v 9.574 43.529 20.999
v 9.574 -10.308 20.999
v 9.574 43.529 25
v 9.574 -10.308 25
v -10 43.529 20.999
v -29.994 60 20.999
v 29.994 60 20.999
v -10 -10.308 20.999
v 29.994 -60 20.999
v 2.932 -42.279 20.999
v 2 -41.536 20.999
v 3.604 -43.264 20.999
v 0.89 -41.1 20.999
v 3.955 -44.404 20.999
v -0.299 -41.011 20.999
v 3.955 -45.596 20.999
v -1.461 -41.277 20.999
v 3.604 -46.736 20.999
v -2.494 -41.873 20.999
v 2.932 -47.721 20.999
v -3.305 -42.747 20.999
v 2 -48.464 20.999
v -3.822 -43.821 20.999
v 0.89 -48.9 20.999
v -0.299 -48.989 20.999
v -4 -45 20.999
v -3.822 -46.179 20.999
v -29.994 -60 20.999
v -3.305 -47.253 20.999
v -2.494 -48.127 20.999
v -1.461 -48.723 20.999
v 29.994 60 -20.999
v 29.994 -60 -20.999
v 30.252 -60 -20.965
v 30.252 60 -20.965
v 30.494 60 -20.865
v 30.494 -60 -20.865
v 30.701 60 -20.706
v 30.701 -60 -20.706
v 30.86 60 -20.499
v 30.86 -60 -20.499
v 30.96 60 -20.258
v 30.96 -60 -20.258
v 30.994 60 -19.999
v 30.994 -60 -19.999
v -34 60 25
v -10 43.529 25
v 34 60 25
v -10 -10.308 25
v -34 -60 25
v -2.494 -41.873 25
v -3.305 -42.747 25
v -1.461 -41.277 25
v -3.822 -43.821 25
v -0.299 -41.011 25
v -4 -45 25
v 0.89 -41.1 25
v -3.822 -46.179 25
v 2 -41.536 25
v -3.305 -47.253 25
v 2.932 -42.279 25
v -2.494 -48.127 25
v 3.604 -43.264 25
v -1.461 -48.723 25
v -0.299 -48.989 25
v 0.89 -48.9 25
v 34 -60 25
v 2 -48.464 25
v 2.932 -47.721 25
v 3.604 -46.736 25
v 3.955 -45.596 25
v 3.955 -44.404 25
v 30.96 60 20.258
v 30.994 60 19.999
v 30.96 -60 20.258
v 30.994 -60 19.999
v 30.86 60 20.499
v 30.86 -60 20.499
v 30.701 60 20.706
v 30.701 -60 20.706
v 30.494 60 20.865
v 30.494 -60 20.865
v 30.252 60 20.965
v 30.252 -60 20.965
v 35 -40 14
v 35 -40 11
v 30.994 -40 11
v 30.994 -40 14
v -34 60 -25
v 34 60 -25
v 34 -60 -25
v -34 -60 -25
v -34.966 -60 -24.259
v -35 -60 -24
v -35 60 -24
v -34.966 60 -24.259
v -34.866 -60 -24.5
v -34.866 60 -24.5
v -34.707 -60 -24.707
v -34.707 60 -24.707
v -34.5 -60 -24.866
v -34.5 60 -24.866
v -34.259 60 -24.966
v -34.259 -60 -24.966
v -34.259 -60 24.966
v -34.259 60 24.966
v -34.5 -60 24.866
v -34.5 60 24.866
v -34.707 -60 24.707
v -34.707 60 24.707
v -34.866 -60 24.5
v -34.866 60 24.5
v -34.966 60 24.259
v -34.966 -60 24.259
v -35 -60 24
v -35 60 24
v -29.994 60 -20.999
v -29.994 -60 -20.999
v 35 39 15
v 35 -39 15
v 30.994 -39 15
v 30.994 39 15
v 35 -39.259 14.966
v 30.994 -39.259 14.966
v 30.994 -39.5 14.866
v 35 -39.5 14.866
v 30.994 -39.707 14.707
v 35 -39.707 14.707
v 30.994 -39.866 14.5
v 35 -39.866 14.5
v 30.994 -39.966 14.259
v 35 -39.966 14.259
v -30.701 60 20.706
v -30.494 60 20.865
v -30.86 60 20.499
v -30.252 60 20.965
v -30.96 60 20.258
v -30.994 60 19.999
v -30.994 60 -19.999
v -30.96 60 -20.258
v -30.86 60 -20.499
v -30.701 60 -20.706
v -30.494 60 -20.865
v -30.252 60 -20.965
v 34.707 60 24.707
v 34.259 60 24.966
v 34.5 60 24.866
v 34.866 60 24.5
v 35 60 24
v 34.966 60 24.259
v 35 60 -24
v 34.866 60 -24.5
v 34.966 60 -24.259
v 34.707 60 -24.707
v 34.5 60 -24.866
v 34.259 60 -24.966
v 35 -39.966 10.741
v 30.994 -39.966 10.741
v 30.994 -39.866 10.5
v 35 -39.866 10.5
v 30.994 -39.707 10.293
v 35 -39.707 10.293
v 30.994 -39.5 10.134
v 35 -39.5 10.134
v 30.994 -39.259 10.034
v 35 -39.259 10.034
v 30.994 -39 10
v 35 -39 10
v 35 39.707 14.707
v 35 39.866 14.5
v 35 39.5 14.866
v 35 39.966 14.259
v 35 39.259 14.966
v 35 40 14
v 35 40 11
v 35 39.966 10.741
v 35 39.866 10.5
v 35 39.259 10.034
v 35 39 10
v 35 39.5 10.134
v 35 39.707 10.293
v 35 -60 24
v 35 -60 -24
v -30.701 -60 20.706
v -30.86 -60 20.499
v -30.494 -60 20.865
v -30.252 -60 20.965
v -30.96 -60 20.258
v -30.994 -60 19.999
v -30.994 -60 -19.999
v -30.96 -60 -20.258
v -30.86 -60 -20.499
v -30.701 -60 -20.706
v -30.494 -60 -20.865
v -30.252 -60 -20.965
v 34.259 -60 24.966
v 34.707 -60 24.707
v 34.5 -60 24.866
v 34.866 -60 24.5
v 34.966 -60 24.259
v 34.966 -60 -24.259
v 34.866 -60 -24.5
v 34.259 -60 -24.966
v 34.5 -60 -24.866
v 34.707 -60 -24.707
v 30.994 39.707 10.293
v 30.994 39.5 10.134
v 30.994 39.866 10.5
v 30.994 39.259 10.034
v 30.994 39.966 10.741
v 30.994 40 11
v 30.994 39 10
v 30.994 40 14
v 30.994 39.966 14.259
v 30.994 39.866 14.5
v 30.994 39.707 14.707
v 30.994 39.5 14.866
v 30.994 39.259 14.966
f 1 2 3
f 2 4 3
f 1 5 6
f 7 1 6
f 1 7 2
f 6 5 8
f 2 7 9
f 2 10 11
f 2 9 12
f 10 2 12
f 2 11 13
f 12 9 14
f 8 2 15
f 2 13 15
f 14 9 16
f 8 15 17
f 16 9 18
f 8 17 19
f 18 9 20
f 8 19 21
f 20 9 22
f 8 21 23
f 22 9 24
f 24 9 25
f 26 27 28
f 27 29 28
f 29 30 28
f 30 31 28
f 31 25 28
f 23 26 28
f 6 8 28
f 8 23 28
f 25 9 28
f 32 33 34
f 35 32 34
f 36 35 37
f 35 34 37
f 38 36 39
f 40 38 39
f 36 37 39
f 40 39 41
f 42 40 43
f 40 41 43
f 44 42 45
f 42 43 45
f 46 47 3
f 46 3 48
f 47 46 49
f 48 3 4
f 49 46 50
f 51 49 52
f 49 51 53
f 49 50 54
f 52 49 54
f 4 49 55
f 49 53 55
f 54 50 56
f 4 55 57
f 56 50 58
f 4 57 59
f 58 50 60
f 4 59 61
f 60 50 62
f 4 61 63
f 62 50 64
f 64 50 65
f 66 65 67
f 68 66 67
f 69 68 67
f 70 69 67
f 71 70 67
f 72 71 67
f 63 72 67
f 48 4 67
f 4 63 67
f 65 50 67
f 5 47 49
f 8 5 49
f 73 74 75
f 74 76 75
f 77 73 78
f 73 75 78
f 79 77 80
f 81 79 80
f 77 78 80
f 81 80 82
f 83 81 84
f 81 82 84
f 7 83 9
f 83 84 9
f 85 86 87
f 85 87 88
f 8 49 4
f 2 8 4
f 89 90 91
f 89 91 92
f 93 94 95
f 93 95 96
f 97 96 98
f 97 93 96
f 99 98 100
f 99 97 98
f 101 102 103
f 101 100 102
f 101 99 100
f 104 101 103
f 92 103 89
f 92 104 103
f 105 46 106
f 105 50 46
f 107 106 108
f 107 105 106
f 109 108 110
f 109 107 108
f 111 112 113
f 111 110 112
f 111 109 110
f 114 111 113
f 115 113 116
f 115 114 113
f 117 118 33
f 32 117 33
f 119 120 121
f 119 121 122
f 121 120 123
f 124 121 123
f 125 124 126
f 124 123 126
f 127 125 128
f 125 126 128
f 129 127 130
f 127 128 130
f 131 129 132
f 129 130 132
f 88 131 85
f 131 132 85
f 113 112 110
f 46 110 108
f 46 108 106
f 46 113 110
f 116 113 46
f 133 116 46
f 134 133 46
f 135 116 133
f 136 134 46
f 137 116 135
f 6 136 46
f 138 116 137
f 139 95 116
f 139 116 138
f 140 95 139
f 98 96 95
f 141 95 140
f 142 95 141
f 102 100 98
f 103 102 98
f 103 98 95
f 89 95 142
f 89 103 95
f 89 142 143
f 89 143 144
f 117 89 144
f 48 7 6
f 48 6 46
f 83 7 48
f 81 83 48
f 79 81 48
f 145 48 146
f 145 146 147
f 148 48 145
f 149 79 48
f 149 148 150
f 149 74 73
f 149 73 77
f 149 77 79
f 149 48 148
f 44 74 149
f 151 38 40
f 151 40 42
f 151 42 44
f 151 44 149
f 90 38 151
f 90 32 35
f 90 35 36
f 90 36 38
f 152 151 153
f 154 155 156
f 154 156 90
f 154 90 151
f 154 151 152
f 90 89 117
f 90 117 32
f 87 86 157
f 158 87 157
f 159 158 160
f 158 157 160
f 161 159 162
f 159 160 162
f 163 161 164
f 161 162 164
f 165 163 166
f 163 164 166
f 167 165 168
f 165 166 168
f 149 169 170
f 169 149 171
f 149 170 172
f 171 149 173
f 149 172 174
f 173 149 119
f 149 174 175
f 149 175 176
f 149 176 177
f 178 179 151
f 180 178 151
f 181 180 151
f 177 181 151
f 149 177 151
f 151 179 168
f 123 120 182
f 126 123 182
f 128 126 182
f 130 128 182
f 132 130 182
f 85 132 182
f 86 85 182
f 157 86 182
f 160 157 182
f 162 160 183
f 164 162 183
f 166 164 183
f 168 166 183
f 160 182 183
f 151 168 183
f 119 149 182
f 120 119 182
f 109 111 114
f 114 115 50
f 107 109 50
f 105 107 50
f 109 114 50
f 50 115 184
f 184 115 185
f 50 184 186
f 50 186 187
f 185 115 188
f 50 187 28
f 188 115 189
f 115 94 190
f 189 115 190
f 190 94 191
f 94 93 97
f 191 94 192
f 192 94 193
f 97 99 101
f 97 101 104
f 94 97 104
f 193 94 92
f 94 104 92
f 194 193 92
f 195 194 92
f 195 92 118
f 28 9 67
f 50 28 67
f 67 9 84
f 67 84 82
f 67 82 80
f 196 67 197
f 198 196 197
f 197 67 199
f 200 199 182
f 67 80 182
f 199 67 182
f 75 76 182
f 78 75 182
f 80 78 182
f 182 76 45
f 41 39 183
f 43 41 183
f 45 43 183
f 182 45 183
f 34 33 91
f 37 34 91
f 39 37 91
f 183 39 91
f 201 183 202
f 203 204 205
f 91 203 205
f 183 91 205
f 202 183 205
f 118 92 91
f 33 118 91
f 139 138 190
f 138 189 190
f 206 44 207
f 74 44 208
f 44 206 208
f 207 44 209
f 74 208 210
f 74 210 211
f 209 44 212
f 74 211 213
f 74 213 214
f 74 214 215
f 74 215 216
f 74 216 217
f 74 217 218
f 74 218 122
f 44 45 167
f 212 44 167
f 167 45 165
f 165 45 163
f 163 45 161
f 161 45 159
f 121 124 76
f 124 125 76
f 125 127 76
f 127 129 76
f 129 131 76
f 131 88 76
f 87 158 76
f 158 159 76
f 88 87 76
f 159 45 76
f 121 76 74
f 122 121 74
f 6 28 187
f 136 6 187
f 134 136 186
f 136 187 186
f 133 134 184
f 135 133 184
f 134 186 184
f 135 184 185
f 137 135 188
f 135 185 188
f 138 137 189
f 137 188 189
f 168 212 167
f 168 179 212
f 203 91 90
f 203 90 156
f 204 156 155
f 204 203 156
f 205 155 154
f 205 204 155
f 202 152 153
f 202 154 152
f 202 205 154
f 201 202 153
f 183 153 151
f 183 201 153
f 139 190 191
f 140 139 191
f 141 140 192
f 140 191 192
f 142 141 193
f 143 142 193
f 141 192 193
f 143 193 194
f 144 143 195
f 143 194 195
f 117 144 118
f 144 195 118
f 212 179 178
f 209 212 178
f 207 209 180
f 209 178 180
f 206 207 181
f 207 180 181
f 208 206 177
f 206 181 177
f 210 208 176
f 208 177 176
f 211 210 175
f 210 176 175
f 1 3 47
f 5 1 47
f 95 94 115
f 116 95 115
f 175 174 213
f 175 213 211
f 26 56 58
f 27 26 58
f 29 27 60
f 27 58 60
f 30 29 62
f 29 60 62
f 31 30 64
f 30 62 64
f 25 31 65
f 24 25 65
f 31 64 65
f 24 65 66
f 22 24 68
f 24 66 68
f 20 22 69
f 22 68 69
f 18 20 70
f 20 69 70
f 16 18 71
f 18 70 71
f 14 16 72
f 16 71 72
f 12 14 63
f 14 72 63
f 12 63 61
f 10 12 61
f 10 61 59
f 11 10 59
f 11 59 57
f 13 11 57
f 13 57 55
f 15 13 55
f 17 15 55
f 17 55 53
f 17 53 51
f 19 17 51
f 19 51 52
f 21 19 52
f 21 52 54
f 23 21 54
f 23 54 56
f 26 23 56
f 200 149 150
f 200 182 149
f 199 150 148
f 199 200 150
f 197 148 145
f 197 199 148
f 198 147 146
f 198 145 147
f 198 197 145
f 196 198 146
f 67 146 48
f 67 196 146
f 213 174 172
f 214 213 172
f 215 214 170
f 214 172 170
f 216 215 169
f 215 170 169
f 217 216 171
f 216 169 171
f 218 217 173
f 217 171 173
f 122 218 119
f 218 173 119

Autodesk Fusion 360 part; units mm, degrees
sketch "Sketch1" plane through (0, 0, 0) normal (0, 1, 0) x (1, 0, 0)
  line L0 (-65, 0) -> (50, 0) construction
  line L1 (-34, -25) -> (34, -25)
  line L2 (35, -24) -> (35, 24)
  line L3 (34, 25) -> (-34, 25)
  line L4 (-35, 24) -> (-35, -24)
  line L5 (-35, 25) -> (35, -25) construction
  line L6 (-35, -25) -> (35, 25) construction
  arc A0 (-35, -24) -> (-34, -25) centre (-34, -24) ccw
  arc A1 (34, -25) -> (35, -24) centre (34, -24) ccw
  arc A2 (35, 24) -> (34, 25) centre (34, 24) ccw
  arc A3 (-34, 25) -> (-35, 24) centre (-34, 24) ccw
  point P0 (-32.7786, 20)
  point P1 (32.2214, 20)
  point P2 (-32.7786, -20)
  dimension "d7" = 70
  dimension "d8" = 50
  dimension "d9" = 1
  dimension "d10" = 1
extrude "Extrude1" add sketch "Sketch1" along normal mid plane 120
sketch "Sketch2" plane through (0, -60, 0) normal (0, -1, 0) x (1, 0, 0)
  arc A0 (-35, -24) -> (-34, -25) centre (-34, -24) ccw
  line L0 (-34, -25) -> (34, -25)
  arc A1 (34, -25) -> (35, -24) centre (34, -24) ccw
  line L1 (35, -24) -> (35, 24)
  arc A2 (35, 24) -> (34, 25) centre (34, 24) ccw
  line L2 (34, 25) -> (-34, 25)
  arc A3 (-34, 25) -> (-35, 24) centre (-34, 24) ccw
  line L3 (-35, 24) -> (-35, -24)
  line L4 (-29.9936, -20.9993) -> (29.9936, -20.9993)
  line L5 (30.9936, -19.9993) -> (30.9936, 19.9993)
  line L6 (29.9936, 20.9993) -> (-29.9936, 20.9993)
  line L7 (-30.9936, 19.9993) -> (-30.9936, -19.9993)
  arc A4 (-29.9936, 20.9993) -> (-30.9936, 19.9993) centre (-29.9936, 19.9993) ccw
  arc A5 (30.9936, 19.9993) -> (29.9936, 20.9993) centre (29.9936, 19.9993) ccw
  arc A6 (29.9936, -20.9993) -> (30.9936, -19.9993) centre (29.9936, -19.9993) ccw
  arc A7 (-30.9936, -19.9993) -> (-29.9936, -20.9993) centre (-29.9936, -19.9993) ccw
  line L8 (-45, 0) -> (50, 0) construction
  line L9 (0, 30) -> (0, -30) construction
  dimension "d11" = 1
extrude "Extrude2" cut sketch "Sketch2" against normal blind 120 contours L4 L5 L6 L7 A4 A5 A6 A7
sketch "Sketch3" plane through (0, 0, 25) normal (0, 0, 1) x (-1, 0, 0)
  line L0 (-34, 60) -> (-34, -60)
  line L1 (-34, -60) -> (34, -60)
  line L2 (34, -60) -> (34, 60)
  line L3 (34, 60) -> (-34, 60)
  circle A0 centre (0, 45) radius 4
  line L4 (10, 10.3084) -> (-9.5736, 10.3084)
  line L5 (-9.5736, 10.3084) -> (-9.5736, -43.5288)
  line L6 (-9.5736, -43.5288) -> (10, -43.5288)
  line L7 (10, -43.5288) -> (10, 10.3084)
  dimension "d14" = 8
extrude "Extrude3" cut sketch "Sketch3" against normal blind 5 contours A0 | L4 L5 L6 L7
sketch "Sketch4" plane through (35, 0, 0) normal (1, 0, 0) x (0, 1, 0)
  line L0 (-60, -24) -> (60, -24)
  line L1 (60, -24) -> (60, 24)
  line L2 (60, 24) -> (-60, 24)
  line L3 (-60, 24) -> (-60, -24)
  line L4 (-39, 15) -> (39, 15)
  line L5 (40, 14) -> (40, 11)
  line L6 (39, 10) -> (-39, 10)
  line L7 (-40, 11) -> (-40, 14)
  arc A0 (-39, 15) -> (-40, 14) centre (-39, 14) ccw
  arc A1 (40, 14) -> (39, 15) centre (39, 14) ccw
  arc A2 (39, 10) -> (40, 11) centre (39, 11) ccw
  arc A3 (-40, 11) -> (-39, 10) centre (-39, 11) ccw
  dimension "d17" = 1
extrude "Extrude4" cut sketch "Sketch4" against normal blind 5 contours L4 L5 L6 L7 A0 A1 A2 A3
